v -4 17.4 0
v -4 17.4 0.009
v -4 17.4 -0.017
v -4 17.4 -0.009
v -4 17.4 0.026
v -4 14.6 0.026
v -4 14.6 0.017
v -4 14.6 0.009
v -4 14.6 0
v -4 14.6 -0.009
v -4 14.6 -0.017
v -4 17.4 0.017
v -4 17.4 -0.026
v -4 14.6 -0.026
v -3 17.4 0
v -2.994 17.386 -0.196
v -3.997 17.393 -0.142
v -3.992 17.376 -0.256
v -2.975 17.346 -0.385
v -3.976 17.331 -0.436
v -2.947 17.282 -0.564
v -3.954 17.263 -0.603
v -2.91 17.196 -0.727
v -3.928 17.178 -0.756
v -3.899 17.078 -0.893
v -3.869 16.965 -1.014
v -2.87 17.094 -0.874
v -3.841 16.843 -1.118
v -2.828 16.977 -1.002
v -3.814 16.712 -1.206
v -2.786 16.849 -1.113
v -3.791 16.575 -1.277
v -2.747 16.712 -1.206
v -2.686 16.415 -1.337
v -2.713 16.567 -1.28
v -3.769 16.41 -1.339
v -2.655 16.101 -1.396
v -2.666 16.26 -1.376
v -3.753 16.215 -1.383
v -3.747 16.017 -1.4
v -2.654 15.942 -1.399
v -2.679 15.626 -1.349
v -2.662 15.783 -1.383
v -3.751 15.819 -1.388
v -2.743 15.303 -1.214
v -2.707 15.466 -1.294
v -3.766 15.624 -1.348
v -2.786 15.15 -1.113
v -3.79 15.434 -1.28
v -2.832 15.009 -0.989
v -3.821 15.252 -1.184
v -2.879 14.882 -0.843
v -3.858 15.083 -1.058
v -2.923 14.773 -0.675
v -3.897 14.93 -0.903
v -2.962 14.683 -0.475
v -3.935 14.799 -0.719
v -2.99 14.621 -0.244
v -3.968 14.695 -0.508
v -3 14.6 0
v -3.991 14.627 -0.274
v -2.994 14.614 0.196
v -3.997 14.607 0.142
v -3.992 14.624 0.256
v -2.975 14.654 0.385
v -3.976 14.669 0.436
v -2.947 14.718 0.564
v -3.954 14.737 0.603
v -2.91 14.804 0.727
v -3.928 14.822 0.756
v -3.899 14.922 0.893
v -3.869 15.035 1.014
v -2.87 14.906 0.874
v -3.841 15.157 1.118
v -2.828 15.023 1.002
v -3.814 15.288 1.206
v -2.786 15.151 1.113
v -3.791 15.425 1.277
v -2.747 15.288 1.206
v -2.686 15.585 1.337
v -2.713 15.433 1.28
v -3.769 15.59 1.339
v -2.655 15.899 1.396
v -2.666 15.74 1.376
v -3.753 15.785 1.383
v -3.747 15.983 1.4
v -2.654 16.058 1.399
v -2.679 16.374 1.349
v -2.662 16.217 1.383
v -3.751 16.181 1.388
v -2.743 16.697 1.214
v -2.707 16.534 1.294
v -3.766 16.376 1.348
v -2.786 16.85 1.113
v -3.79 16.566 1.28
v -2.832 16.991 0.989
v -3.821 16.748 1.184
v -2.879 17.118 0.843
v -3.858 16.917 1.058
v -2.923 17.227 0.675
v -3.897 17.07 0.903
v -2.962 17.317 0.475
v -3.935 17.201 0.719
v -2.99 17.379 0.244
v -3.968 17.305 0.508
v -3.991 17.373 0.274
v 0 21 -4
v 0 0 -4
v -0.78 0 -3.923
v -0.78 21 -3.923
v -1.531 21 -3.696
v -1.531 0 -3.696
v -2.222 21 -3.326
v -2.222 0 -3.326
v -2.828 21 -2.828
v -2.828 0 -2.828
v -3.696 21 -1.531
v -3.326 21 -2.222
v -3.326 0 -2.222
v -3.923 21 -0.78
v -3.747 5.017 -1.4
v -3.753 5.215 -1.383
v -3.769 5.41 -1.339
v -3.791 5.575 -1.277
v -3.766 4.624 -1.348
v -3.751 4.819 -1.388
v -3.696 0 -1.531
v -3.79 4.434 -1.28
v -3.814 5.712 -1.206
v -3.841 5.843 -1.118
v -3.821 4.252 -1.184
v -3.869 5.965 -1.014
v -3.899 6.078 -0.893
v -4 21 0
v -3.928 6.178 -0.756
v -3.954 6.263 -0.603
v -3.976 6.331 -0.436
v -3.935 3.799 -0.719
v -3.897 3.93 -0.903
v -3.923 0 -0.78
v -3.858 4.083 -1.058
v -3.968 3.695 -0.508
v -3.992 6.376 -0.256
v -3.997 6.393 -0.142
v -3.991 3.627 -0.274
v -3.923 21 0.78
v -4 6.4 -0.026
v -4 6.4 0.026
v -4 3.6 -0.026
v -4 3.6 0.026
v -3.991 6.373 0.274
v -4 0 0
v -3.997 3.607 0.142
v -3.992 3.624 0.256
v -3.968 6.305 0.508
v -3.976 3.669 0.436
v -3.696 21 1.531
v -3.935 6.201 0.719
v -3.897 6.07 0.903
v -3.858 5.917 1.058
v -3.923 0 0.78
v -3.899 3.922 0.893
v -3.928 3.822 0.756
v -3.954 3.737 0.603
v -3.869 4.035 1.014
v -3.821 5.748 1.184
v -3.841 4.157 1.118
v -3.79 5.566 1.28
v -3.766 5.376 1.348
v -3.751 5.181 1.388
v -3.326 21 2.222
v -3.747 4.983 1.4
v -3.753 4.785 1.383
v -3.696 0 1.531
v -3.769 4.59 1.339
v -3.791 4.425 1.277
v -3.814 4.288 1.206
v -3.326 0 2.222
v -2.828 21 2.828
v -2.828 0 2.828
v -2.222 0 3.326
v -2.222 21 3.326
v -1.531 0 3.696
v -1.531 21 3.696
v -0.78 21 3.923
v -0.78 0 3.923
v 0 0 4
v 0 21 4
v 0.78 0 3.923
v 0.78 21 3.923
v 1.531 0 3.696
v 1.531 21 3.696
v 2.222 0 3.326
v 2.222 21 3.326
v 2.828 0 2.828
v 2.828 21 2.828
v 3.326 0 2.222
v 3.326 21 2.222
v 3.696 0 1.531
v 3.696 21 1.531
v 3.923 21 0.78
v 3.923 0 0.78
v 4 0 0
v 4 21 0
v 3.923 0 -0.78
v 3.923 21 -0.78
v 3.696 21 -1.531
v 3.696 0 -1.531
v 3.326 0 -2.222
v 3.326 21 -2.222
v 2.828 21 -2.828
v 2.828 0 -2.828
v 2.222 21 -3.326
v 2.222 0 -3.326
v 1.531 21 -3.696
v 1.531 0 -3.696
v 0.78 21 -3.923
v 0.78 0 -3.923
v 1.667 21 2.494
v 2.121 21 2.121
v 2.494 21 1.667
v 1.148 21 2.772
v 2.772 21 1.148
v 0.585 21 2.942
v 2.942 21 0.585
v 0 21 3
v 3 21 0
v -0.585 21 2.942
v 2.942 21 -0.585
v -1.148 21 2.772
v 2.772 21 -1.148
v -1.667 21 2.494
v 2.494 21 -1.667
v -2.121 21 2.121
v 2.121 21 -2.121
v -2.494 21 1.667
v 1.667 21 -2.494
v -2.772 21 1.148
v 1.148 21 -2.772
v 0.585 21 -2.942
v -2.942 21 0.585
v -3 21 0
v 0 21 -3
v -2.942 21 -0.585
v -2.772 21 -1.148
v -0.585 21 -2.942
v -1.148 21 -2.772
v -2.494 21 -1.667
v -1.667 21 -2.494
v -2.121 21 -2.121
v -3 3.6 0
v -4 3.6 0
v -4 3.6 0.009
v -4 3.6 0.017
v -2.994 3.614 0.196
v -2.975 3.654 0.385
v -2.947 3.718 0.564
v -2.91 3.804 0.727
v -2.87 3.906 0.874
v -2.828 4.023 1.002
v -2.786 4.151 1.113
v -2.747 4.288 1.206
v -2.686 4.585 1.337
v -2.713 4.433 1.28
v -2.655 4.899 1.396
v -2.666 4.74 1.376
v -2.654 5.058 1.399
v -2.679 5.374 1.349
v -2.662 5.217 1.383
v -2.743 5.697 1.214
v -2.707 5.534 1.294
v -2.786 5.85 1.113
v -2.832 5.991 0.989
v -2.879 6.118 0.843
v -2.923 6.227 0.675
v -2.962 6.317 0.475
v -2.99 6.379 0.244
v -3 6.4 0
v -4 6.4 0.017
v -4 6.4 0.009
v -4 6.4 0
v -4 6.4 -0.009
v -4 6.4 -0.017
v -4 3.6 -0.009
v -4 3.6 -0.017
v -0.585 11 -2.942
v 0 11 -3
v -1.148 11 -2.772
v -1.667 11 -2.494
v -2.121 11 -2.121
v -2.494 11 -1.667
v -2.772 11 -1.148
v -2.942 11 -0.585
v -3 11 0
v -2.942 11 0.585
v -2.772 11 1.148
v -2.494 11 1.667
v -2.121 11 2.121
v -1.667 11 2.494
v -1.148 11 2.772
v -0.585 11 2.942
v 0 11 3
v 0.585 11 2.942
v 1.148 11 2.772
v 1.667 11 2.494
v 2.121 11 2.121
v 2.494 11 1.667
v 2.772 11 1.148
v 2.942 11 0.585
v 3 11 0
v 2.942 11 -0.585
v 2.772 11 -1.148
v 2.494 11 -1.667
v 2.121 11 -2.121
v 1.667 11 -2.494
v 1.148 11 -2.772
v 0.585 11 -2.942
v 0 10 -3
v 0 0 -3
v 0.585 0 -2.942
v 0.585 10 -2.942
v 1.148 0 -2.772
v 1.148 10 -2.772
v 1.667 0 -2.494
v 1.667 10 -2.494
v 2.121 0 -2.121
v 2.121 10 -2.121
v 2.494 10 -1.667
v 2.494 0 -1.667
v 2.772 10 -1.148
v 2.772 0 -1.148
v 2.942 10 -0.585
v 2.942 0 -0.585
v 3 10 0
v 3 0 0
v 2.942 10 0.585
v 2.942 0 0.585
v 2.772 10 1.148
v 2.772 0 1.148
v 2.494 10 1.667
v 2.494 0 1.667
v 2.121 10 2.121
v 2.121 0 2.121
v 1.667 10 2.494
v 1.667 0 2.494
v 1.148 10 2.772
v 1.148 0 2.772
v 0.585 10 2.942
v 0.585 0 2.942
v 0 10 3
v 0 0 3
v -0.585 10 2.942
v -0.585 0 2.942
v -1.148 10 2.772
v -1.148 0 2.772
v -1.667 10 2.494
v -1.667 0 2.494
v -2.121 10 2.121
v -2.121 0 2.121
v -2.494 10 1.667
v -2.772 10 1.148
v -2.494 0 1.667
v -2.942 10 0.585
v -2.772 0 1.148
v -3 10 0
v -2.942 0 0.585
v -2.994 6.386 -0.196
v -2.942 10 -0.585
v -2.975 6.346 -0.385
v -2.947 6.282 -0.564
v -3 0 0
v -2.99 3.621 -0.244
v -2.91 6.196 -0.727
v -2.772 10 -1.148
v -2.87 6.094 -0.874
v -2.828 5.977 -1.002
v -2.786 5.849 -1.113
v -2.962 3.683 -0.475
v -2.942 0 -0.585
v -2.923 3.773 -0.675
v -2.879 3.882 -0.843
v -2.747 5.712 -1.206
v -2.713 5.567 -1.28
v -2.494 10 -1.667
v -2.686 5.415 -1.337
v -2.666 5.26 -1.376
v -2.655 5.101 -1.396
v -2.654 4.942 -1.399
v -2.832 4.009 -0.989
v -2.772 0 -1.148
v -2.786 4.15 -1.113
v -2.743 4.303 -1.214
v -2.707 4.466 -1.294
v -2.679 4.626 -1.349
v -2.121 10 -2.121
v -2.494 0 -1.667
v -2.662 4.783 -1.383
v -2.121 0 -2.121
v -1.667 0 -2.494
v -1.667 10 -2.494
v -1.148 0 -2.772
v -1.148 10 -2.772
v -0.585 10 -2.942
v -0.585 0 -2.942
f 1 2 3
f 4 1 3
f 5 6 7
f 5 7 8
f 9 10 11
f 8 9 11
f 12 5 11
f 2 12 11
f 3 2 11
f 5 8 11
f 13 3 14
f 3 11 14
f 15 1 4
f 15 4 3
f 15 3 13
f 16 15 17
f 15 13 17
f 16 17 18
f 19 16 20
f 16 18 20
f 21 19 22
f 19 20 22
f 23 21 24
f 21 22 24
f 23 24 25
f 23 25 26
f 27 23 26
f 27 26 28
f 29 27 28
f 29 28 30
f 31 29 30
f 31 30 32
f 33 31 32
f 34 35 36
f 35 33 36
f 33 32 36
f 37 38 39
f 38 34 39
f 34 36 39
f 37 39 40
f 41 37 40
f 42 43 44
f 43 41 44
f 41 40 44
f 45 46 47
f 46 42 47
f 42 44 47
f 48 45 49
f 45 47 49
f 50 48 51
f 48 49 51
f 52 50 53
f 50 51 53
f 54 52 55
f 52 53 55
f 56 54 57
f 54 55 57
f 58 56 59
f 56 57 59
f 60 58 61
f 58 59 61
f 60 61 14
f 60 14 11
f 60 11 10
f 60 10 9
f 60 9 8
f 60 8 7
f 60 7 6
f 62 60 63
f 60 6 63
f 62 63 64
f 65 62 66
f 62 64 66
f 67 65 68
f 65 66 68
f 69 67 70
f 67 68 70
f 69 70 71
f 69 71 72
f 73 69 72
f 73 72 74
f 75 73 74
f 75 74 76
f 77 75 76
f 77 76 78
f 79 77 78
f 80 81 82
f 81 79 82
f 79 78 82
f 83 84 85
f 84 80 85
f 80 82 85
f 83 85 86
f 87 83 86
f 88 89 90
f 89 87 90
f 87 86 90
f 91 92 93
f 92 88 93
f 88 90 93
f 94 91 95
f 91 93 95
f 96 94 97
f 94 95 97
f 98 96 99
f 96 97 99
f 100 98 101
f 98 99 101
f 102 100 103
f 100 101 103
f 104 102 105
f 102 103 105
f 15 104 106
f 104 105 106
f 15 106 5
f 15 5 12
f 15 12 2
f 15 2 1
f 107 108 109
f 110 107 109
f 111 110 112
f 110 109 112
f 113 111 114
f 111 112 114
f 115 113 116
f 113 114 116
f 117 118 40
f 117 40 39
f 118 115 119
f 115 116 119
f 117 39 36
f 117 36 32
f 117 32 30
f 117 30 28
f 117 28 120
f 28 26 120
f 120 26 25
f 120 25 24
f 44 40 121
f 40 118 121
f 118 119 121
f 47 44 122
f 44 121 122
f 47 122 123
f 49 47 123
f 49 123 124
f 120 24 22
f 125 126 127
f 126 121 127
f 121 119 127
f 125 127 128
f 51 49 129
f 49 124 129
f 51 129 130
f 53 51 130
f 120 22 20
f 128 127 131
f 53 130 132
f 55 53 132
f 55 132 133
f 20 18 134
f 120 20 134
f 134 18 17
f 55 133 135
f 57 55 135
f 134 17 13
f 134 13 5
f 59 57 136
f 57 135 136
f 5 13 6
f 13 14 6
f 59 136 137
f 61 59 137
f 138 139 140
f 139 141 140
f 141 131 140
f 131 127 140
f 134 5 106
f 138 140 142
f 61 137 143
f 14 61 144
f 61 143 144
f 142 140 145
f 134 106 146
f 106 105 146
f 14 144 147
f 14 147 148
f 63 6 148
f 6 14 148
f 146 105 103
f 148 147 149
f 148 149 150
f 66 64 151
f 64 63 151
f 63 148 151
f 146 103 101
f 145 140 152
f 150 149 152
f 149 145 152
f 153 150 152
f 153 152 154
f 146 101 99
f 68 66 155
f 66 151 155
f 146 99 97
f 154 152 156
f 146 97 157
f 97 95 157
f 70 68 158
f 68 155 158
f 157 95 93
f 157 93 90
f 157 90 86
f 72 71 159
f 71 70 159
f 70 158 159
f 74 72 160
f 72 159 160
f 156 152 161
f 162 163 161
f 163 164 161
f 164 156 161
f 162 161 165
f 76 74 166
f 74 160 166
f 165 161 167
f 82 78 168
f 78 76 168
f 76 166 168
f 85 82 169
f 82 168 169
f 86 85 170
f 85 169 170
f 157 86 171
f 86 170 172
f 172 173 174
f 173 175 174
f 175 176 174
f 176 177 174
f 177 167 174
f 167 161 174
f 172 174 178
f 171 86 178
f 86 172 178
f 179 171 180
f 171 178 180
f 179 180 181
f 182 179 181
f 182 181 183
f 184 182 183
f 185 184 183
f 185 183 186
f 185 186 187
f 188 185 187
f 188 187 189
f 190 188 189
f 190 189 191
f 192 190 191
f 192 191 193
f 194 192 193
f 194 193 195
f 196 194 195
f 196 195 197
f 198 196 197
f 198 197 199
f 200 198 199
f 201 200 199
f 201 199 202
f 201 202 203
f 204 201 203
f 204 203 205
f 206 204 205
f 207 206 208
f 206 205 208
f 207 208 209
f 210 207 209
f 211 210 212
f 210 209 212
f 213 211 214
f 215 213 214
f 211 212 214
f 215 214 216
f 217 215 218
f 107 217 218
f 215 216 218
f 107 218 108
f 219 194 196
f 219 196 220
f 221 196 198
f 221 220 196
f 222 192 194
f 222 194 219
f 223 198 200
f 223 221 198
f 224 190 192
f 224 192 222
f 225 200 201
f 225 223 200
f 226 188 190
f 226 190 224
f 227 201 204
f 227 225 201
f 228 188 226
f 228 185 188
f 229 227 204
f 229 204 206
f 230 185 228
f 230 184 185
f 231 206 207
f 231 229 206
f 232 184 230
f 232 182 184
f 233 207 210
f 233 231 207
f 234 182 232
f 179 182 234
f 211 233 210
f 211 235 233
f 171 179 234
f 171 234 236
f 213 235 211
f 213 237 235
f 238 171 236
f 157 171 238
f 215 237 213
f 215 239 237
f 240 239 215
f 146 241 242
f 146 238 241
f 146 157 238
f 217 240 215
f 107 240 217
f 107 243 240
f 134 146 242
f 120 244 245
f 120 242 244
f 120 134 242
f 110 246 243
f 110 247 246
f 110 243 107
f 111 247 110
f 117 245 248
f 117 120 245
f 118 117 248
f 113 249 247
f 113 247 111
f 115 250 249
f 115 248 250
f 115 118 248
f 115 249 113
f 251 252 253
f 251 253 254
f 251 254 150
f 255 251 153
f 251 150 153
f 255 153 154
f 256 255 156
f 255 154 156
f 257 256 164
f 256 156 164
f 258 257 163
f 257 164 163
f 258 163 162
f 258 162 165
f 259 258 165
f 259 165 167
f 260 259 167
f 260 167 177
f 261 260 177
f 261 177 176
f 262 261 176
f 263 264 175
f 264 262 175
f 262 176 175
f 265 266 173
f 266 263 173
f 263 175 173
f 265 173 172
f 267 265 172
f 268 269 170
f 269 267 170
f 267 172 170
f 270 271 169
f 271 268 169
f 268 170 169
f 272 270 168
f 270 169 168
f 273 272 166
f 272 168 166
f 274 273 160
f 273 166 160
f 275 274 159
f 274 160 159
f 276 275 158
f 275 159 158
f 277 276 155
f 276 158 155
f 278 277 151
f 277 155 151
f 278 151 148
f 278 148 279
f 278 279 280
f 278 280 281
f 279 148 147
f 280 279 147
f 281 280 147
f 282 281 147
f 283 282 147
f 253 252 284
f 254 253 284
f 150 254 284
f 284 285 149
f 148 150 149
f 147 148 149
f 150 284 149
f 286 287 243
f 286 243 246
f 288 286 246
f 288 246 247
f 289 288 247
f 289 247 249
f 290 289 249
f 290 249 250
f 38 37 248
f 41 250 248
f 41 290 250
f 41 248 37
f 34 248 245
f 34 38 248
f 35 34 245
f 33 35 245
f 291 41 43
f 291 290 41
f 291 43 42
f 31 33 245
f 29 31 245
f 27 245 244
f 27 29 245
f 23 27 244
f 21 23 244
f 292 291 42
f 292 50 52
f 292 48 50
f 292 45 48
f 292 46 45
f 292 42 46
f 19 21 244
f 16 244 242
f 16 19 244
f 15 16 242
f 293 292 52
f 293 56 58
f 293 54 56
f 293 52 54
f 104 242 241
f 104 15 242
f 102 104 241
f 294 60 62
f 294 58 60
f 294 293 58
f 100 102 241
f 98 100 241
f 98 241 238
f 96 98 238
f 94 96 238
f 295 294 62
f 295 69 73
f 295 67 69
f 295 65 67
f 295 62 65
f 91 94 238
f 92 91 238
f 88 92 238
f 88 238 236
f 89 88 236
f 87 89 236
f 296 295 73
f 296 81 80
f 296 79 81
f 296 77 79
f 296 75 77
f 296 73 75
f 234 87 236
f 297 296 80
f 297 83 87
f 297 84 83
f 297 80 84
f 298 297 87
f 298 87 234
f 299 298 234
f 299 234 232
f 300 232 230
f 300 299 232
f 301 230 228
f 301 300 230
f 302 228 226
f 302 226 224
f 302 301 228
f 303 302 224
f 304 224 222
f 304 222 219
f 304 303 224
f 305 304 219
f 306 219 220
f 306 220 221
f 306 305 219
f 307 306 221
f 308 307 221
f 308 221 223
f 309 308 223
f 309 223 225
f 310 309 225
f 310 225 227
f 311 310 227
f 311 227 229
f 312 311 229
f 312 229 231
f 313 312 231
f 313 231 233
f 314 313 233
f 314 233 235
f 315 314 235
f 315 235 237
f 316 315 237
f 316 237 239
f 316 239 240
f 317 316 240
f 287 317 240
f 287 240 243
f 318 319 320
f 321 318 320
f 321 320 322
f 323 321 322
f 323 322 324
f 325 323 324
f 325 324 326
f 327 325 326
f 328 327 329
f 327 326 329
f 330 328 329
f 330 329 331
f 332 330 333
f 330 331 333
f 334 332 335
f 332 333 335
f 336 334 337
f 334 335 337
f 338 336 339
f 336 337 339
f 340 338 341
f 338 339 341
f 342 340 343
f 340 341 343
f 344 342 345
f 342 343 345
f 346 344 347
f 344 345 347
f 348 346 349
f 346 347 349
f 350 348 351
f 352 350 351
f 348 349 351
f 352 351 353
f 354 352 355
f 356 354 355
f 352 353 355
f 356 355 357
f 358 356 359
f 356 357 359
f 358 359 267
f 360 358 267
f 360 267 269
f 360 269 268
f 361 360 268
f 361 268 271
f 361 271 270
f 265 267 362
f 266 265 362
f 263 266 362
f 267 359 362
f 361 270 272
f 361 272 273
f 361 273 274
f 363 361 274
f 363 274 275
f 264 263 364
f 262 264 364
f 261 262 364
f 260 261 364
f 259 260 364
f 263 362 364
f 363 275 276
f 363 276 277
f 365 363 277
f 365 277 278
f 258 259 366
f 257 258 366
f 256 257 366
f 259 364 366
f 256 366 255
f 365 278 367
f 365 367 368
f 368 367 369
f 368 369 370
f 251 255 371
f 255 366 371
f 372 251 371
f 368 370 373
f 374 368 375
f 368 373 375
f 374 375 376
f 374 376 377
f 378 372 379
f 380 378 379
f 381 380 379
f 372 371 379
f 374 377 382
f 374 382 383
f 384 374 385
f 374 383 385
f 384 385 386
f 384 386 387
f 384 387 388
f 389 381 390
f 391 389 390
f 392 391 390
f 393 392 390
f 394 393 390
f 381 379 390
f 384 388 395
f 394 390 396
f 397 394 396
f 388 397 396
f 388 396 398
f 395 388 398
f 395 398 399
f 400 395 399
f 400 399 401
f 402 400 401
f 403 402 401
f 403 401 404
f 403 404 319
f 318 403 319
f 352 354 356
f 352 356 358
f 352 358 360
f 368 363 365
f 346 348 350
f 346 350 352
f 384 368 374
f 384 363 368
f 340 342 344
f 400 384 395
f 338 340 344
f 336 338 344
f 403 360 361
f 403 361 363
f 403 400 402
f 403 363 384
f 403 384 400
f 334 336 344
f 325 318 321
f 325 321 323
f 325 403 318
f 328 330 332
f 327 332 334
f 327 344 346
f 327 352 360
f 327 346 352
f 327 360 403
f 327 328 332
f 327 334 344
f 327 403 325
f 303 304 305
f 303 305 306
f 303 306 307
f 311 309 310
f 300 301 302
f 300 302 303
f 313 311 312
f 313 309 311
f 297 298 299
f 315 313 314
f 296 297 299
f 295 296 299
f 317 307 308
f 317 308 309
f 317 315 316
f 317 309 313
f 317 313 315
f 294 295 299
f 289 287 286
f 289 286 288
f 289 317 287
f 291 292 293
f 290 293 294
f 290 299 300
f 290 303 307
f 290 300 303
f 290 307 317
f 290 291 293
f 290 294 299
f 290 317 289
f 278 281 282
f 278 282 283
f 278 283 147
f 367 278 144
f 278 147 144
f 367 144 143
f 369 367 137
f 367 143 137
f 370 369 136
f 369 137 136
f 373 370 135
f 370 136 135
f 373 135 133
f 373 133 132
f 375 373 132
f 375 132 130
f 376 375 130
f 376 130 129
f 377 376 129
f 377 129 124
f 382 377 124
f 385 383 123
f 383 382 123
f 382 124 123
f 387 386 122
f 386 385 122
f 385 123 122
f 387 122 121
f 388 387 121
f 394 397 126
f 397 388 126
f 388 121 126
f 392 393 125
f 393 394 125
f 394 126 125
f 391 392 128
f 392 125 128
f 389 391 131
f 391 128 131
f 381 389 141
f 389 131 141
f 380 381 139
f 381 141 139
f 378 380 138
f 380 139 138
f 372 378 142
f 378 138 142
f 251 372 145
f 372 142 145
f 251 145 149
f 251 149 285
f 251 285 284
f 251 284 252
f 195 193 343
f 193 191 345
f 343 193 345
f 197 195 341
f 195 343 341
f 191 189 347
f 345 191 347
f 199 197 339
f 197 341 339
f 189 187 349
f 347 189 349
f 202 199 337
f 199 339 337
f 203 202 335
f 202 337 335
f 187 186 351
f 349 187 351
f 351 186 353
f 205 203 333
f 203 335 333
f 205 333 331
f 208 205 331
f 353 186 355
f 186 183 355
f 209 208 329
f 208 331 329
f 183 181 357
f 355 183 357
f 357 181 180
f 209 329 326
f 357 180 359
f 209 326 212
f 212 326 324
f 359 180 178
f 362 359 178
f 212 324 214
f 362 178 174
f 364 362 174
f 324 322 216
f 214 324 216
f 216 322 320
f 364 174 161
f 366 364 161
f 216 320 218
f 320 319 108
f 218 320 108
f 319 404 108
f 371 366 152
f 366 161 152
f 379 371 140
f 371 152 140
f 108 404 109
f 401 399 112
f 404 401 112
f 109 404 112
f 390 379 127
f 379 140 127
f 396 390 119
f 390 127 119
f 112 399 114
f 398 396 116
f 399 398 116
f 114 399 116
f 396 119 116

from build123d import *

# Parameters (mm, degrees)
SKETCH1_R           = 4
BOSS_EXTRUDE1_DEPTH = 21
SKETCH2_R           = 3
CUT_EXTRUDE1_DEPTH  = 10
CUT_EXTRUDE3_START  = -10
SKETCH3_R           = 3
CUT_EXTRUDE3_DEPTH  = 10


with BuildPart() as part:
    # Sketch1 → Boss-Extrude1 (new body)
    with BuildSketch(Plane(origin=(0, 0, 0), x_dir=(1, 0, 0), z_dir=(0, 1, 0))):
        with Locations(Location((0, 0, 0), (0, 0, 90))):
            Circle(SKETCH1_R)
    extrude(amount=BOSS_EXTRUDE1_DEPTH)

    # Sketch2 → Cut-Extrude1 (cut)
    with BuildSketch(Plane.XZ):
        with Locations(Location((0, 0, 0), (0, 0, 270))):
            Circle(SKETCH2_R)
    extrude(amount=-CUT_EXTRUDE1_DEPTH, mode=Mode.SUBTRACT)

    # Sketch3 → Cut-Extrude3 (cut)
    with BuildSketch(Plane(origin=(0, 21, 0), x_dir=(1, 0, 0), z_dir=(0, 1, 0)).offset(CUT_EXTRUDE3_START)):
        with Locations(Location((0, 0, 0), (0, 0, 90))):
            Circle(SKETCH3_R)
    extrude(amount=CUT_EXTRUDE3_DEPTH, mode=Mode.SUBTRACT)

    # Cut-Extrude5: read off the stored shape, not the designer's step
    # Cut-Extrude5: loft between two sections, ruled curve by curve
    cut_extrude5_from = [
        Edge.make_three_point_arc((-2.653136305, 14.6, 0), (-2.653136305, 16, 1.4), (-2.653136305, 17.4, 0)),
        Edge.make_three_point_arc((-2.653136305, 17.4, 0), (-2.653136305, 16, -1.4), (-2.653136305, 14.6, 0)),
    ]
    cut_extrude5_to = [
        Edge.make_three_point_arc((-3.999916451, 14.6, 0), (-3.999916451, 16, 1.4), (-3.999916451, 17.4, 0)),
        Edge.make_three_point_arc((-3.999916451, 17.4, 0), (-3.999916451, 16, -1.4), (-3.999916451, 14.6, 0)),
    ]
    cut_extrude5 = Solid(Shell([*[Face.make_surface_from_curves(cut_extrude5_from[k], cut_extrude5_to[k]) for k in range(2)], Face(Wire(cut_extrude5_from)), Face(Wire(cut_extrude5_to))]))
    add(cut_extrude5, mode=Mode.SUBTRACT)

    # Cut-Extrude5 2: loft between two sections, ruled curve by curve
    cut_extrude5_2_from = [
        Edge.make_three_point_arc((-2.653136305, 3.6, 0), (-2.653136305, 5, 1.4), (-2.653136305, 6.4, 0)),
        Edge.make_three_point_arc((-2.653136305, 6.4, 0), (-2.653136305, 5, -1.4), (-2.653136305, 3.6, 0)),
    ]
    cut_extrude5_2_to = [
        Edge.make_three_point_arc((-3.999916451, 3.6, 0), (-3.999916451, 5, 1.4), (-3.999916451, 6.4, 0)),
        Edge.make_three_point_arc((-3.999916451, 6.4, 0), (-3.999916451, 5, -1.4), (-3.999916451, 3.6, 0)),
    ]
    cut_extrude5_2 = Solid(Shell([*[Face.make_surface_from_curves(cut_extrude5_2_from[k], cut_extrude5_2_to[k]) for k in range(2)], Face(Wire(cut_extrude5_2_from)), Face(Wire(cut_extrude5_2_to))]))
    add(cut_extrude5_2, mode=Mode.SUBTRACT)


solid = part.part
